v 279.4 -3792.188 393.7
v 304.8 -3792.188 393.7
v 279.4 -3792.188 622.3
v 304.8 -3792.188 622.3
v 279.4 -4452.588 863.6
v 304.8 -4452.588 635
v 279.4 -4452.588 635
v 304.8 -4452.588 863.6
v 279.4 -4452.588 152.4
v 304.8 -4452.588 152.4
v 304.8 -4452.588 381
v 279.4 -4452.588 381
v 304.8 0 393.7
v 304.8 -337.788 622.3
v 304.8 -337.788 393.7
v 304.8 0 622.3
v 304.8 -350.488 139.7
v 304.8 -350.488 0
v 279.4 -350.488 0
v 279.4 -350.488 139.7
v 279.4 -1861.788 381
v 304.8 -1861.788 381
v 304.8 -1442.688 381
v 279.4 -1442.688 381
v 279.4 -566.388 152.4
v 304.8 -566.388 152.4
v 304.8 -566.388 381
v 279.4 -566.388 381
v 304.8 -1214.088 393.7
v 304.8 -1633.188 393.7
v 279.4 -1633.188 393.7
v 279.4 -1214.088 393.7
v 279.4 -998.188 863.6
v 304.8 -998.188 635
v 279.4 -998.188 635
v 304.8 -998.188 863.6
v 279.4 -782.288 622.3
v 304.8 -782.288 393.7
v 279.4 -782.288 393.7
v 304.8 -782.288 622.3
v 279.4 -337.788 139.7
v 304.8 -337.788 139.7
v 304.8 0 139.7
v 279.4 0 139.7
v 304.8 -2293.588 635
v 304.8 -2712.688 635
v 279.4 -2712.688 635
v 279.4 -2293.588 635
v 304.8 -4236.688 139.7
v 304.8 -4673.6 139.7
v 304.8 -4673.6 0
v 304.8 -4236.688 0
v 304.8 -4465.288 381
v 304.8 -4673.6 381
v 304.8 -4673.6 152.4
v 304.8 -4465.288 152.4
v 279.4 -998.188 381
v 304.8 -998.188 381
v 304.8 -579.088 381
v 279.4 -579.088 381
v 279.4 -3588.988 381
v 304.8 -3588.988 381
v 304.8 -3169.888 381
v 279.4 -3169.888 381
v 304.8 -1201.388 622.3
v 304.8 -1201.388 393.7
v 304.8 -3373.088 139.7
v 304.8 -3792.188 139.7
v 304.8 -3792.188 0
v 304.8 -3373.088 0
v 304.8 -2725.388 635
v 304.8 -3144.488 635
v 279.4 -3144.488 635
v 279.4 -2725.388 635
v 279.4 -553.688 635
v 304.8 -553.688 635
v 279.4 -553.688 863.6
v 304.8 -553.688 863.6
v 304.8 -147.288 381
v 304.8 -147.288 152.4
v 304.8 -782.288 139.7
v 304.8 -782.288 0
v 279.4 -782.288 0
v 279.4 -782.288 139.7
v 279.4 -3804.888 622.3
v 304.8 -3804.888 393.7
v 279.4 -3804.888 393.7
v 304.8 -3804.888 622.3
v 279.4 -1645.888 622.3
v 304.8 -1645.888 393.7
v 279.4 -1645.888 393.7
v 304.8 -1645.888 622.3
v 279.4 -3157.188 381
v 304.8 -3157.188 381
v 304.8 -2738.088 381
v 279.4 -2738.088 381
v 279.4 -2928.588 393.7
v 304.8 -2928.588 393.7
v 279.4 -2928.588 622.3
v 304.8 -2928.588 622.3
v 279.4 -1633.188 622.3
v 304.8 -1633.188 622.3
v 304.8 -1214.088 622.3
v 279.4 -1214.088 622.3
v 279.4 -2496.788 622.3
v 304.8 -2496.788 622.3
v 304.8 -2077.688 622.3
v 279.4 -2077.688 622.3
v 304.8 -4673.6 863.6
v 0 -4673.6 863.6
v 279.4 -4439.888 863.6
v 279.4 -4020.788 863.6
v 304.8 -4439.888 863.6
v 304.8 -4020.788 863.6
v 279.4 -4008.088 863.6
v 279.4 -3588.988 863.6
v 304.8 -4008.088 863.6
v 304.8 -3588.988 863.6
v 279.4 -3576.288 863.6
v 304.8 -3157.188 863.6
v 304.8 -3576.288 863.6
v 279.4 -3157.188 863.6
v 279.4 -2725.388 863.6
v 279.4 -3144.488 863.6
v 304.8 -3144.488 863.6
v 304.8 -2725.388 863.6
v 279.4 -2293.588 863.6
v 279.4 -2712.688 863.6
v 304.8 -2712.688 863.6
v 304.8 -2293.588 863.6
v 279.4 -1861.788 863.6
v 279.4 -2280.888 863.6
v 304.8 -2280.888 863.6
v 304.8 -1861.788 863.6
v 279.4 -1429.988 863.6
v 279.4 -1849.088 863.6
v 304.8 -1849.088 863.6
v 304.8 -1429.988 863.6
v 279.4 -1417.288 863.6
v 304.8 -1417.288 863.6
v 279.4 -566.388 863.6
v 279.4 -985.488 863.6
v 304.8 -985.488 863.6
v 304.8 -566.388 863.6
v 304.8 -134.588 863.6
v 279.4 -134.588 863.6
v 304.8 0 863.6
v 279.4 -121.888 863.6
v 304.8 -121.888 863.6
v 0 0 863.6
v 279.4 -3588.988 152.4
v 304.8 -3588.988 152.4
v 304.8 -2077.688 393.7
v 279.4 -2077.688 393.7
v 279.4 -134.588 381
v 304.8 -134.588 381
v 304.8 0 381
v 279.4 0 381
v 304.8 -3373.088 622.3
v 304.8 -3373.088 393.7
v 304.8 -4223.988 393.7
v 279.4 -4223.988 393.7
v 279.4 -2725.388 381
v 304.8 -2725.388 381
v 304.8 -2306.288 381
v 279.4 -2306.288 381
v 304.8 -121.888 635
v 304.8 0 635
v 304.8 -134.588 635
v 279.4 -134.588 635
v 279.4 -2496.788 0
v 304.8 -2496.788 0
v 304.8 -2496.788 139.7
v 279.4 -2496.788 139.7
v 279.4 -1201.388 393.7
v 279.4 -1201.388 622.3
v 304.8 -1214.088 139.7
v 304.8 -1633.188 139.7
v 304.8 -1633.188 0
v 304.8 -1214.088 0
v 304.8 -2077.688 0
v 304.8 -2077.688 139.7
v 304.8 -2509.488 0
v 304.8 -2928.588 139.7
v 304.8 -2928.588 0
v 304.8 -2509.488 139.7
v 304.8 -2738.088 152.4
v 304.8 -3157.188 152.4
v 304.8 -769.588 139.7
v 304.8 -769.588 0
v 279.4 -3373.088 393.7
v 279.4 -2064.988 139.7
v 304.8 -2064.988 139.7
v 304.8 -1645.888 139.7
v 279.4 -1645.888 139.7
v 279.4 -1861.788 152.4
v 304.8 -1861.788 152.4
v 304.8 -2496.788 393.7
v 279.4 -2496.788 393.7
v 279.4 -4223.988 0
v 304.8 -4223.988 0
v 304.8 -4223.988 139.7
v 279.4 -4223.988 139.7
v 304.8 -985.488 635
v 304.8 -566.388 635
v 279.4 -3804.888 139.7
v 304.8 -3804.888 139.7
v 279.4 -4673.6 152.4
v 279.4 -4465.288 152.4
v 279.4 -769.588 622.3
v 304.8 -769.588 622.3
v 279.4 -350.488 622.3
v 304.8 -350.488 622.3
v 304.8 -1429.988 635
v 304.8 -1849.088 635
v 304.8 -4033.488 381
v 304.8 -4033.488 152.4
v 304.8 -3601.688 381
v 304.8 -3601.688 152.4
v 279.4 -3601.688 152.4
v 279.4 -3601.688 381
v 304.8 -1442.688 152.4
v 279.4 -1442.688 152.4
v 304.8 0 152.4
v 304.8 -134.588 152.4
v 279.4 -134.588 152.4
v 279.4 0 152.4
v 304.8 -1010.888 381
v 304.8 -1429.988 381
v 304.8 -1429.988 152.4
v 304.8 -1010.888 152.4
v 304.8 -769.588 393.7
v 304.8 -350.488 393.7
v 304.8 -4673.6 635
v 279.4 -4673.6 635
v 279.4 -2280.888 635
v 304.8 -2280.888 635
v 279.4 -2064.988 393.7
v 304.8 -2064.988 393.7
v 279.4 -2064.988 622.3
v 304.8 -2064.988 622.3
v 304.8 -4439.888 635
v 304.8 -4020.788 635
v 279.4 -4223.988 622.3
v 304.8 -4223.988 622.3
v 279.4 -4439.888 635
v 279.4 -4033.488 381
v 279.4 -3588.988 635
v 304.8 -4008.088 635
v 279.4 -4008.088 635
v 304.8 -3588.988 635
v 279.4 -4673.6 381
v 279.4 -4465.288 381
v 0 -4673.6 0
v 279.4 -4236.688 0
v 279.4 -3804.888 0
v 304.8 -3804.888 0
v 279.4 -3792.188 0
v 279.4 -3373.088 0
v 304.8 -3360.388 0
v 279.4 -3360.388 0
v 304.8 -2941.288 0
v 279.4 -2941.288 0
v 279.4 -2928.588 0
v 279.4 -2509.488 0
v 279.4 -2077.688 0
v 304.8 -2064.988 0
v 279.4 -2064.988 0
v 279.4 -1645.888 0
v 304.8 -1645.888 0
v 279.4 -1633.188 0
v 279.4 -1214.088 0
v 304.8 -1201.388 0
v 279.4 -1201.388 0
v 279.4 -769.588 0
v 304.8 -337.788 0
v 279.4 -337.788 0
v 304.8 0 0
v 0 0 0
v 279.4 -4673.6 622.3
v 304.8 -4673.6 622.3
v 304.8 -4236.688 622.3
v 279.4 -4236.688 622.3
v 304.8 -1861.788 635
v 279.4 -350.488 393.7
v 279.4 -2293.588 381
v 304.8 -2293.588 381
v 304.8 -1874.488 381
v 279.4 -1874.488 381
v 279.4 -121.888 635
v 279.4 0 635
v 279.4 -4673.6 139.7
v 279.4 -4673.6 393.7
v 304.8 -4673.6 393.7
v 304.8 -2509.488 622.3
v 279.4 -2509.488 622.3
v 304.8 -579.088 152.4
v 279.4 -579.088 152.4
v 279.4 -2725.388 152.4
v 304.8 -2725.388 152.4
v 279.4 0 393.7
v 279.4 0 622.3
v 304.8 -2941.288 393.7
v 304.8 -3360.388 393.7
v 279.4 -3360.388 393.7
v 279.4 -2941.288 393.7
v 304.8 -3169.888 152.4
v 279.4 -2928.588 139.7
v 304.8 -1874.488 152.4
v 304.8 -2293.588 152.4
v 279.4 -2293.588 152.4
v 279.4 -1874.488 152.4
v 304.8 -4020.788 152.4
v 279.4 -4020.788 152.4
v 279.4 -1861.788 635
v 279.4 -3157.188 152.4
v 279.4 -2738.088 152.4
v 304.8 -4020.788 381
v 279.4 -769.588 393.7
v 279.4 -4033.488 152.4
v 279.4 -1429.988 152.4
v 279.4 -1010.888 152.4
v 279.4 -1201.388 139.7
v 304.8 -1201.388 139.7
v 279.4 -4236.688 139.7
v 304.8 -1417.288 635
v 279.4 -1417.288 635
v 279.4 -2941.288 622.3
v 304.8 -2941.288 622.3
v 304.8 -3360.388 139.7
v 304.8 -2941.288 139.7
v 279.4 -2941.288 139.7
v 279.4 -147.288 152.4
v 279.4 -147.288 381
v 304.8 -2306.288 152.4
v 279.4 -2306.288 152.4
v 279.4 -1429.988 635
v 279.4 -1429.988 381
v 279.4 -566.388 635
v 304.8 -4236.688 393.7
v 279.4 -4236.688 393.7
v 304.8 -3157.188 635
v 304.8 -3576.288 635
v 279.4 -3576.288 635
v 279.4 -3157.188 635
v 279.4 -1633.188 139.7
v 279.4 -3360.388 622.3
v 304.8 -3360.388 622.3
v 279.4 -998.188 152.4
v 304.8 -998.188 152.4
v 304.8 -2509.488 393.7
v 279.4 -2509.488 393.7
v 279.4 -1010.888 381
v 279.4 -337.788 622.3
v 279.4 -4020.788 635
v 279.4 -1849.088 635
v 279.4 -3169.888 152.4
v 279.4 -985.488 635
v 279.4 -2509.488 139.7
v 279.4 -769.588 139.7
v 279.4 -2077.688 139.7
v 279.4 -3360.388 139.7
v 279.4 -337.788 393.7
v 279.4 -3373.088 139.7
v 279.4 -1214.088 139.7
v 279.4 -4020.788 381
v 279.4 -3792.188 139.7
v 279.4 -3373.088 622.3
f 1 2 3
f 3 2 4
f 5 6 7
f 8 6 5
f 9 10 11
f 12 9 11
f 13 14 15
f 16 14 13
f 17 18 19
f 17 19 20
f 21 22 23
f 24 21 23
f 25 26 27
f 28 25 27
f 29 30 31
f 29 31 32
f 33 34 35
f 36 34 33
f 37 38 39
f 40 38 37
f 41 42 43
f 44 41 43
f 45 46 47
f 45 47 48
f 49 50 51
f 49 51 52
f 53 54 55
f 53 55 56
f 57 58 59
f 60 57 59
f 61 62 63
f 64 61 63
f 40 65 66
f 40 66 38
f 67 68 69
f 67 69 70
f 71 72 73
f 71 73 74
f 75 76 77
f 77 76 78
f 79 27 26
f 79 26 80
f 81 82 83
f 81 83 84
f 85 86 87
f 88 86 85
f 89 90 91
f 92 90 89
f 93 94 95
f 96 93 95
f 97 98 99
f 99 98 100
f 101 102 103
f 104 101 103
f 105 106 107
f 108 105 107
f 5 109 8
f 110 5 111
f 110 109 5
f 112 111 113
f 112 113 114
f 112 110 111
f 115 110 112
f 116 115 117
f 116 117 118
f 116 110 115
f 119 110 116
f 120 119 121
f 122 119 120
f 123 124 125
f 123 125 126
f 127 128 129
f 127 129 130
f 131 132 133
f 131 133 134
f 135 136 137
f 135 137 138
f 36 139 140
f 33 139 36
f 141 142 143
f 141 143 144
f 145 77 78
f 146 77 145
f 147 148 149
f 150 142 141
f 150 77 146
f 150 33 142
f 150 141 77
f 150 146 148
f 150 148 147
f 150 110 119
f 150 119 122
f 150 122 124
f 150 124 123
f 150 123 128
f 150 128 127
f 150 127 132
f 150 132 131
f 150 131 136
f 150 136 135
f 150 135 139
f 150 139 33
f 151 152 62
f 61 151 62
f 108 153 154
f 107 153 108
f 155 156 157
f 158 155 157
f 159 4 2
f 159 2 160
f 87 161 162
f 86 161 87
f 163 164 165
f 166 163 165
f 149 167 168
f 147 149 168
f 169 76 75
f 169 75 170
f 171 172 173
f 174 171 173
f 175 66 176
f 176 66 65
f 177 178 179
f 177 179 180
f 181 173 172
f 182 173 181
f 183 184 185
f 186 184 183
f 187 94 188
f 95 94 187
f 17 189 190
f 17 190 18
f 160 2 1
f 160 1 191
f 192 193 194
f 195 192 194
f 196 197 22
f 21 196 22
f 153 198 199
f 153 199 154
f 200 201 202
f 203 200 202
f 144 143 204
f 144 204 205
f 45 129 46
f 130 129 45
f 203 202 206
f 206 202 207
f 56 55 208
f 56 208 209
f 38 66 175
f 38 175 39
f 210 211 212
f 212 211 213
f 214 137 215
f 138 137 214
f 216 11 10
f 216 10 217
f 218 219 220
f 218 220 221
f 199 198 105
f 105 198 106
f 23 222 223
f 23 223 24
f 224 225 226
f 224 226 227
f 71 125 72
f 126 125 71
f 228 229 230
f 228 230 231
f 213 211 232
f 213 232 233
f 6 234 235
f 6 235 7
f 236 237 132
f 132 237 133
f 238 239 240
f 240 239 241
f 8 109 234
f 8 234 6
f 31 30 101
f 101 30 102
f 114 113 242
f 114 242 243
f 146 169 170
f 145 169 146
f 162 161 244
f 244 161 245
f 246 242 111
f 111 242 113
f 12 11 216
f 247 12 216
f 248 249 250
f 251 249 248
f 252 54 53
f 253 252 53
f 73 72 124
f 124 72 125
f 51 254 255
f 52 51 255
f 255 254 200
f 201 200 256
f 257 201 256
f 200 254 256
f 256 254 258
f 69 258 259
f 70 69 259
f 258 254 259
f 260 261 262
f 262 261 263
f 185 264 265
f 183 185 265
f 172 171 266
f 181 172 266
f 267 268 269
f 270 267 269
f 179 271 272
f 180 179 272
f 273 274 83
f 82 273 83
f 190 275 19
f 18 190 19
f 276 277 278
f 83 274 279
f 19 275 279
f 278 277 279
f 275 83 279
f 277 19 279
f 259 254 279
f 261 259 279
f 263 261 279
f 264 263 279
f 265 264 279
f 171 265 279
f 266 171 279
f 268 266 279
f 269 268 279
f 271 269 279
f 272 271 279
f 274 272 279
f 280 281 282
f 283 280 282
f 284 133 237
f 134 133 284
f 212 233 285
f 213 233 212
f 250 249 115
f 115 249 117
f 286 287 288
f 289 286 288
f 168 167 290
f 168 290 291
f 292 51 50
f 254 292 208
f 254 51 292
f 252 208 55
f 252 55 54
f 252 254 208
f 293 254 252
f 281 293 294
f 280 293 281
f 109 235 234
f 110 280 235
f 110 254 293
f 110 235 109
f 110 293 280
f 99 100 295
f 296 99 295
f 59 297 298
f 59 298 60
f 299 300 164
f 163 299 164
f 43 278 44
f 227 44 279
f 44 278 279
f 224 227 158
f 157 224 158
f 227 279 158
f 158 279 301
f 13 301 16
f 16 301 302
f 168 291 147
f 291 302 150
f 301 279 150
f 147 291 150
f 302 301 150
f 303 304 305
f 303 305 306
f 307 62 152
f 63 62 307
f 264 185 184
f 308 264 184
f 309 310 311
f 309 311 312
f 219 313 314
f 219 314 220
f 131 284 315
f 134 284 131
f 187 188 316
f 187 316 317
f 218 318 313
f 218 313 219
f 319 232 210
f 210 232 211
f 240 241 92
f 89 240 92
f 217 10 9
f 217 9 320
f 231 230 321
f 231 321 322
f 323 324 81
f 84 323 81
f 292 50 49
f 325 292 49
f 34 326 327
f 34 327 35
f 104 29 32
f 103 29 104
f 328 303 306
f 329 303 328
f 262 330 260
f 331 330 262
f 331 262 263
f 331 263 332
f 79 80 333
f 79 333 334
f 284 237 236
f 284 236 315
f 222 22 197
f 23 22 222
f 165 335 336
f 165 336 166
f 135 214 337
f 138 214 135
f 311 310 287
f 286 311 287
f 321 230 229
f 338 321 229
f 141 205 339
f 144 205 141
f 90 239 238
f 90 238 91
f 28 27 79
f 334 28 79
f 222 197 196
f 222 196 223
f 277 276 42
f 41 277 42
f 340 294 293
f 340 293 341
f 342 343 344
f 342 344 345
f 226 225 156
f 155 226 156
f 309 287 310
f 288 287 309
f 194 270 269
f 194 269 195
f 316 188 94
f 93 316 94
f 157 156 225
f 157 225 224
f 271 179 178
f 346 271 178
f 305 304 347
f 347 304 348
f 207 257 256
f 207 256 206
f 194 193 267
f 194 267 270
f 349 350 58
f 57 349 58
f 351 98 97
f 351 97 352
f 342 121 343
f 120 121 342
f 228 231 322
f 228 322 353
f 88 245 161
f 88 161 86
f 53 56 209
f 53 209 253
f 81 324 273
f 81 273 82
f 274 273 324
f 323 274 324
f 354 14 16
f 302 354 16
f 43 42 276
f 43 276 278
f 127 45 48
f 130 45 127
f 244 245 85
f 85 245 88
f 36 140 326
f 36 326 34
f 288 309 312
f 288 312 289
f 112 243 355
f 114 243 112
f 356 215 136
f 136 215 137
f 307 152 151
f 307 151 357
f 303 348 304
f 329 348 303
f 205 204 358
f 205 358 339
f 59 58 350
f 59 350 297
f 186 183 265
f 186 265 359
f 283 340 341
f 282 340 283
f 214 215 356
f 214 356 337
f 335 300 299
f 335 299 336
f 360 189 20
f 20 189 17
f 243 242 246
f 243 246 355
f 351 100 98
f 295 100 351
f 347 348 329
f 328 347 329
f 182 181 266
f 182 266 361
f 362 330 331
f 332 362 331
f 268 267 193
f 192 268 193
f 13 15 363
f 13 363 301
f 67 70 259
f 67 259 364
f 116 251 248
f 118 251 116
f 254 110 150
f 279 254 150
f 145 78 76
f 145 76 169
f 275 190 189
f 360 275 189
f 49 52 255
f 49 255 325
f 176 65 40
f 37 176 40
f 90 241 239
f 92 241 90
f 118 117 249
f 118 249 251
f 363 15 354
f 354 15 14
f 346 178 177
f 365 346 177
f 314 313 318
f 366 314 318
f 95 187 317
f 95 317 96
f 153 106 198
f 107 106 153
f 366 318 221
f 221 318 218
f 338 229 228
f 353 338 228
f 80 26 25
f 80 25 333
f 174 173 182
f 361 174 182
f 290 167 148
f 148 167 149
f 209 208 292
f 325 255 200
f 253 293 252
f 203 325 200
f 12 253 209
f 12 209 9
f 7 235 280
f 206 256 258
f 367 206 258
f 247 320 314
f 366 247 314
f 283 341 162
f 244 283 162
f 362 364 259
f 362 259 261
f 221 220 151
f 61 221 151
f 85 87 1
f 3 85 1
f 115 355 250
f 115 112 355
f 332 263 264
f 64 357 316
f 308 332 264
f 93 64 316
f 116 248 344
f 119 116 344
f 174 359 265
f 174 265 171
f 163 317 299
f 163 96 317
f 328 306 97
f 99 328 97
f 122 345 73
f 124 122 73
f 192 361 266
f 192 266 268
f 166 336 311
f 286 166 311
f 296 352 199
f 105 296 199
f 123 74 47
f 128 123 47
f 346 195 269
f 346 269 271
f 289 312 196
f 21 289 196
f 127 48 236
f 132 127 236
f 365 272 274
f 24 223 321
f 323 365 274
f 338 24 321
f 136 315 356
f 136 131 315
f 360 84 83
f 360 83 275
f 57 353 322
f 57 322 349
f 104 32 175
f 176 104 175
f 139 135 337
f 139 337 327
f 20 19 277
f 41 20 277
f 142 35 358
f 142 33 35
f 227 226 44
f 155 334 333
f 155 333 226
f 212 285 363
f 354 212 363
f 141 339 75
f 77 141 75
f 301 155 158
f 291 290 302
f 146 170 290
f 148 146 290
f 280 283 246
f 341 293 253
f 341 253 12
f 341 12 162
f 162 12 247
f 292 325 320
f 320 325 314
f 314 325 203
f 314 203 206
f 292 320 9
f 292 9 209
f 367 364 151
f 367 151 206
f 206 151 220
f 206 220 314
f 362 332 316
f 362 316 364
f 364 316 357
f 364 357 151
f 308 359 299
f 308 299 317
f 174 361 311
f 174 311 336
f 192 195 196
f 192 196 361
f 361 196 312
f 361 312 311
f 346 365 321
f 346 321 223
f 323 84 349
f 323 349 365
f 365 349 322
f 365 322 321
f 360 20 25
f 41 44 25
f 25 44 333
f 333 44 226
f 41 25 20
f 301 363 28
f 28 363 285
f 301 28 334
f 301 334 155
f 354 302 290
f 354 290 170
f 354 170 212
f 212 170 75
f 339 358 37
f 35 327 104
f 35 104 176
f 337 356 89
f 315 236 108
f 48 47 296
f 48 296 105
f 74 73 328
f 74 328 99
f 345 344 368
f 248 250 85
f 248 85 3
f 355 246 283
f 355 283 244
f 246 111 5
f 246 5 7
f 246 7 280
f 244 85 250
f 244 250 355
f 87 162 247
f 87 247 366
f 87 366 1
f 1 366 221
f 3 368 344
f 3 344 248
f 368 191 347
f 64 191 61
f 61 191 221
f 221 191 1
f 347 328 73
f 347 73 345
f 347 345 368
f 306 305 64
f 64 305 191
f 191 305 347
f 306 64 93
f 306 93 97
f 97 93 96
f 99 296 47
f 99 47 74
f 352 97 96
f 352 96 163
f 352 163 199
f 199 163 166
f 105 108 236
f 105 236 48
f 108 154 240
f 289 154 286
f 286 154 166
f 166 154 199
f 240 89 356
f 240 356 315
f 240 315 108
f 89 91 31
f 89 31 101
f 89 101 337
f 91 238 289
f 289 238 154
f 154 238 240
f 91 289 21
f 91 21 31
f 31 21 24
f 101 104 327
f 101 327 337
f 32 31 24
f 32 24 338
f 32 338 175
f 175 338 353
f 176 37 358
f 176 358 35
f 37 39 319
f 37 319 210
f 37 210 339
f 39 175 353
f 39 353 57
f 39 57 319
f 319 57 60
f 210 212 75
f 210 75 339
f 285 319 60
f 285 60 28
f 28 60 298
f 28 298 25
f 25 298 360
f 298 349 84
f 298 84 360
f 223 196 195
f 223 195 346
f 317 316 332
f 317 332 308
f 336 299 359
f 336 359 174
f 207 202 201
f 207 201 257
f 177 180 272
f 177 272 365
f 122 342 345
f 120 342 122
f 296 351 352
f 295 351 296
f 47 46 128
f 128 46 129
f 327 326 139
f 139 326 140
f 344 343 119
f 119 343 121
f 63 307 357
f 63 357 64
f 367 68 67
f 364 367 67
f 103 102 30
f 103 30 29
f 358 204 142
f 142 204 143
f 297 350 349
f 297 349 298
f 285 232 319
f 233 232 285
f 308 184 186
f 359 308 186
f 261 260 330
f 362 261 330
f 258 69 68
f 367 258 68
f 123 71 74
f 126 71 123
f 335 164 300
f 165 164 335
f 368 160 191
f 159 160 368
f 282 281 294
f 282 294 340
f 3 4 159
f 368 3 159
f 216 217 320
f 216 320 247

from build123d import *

# Parameters (mm, degrees)
F0_W     = 4673.6
F0_H     = 863.6
F1_DEPTH = 304.8
F2_W     = 4973.870874
F2_H     = 12.7
F2_W_2   = 5047.692343
F2_W_3   = 5047.768645
F3_DEPTH = 25.4
F4_W     = 12.7
F4_H     = 228.6
F4_H_2   = 139.7
F5_DEPTH = 25.4


with BuildPart() as f1:
    # F0 (on Right) → F1 (new body)
    with BuildSketch(Plane.YZ):
        with Locations((-2336.8, 431.8)):
            Rectangle(F0_W, F0_H)
    extrude(amount=F1_DEPTH)

    # F2 (on face) → F3 (cut)
    with BuildSketch(Plane.YZ.offset(304.8)):
        with Locations((-2338.139236, 628.65)):
            Rectangle(F2_W, F2_H)
        with Locations((-2319.762207, 387.35)):
            Rectangle(F2_W_2, F2_H)
        with Locations((-2421.243641, 146.05)):
            Rectangle(F2_W_3, F2_H)
    extrude(amount=-F3_DEPTH, mode=Mode.SUBTRACT)

    # F4 (on face) → F5 (cut)
    with BuildSketch(Plane.YZ.offset(304.8)):
        with Locations((-4446.238081, 749.3)):
            Rectangle(F4_W, F4_H)
        with Locations((-4230.338081, 508)):
            Rectangle(F4_W, F4_H)
        with Locations((-4458.938081, 266.7)):
            Rectangle(F4_W, F4_H)
        with Locations((-4230.338081, 69.85)):
            Rectangle(F4_W, F4_H_2)
        with Locations((-4027.138081, 266.7)):
            Rectangle(F4_W, F4_H)
        with Locations((-3798.538081, 69.85)):
            Rectangle(F4_W, F4_H_2)
        with Locations((-3798.538081, 508)):
            Rectangle(F4_W, F4_H)
        with Locations((-4014.438081, 749.3)):
            Rectangle(F4_W, F4_H)
        with Locations((-3595.338081, 266.7)):
            Rectangle(F4_W, F4_H)
        with Locations((-3366.738081, 69.85)):
            Rectangle(F4_W, F4_H_2)
        with Locations((-3366.738081, 508)):
            Rectangle(F4_W, F4_H)
        with Locations((-3582.638081, 749.3)):
            Rectangle(F4_W, F4_H)
        with Locations((-3163.538081, 266.7)):
            Rectangle(F4_W, F4_H)
        with Locations((-2934.938081, 69.85)):
            Rectangle(F4_W, F4_H_2)
        with Locations((-2934.938081, 508)):
            Rectangle(F4_W, F4_H)
        with Locations((-3150.838081, 749.3)):
            Rectangle(F4_W, F4_H)
        with Locations((-2731.738081, 266.7)):
            Rectangle(F4_W, F4_H)
        with Locations((-2503.138081, 69.85)):
            Rectangle(F4_W, F4_H_2)
        with Locations((-2503.138081, 508)):
            Rectangle(F4_W, F4_H)
        with Locations((-2719.038081, 749.3)):
            Rectangle(F4_W, F4_H)
        with Locations((-2299.938081, 266.7)):
            Rectangle(F4_W, F4_H)
        with Locations((-2071.338081, 69.85)):
            Rectangle(F4_W, F4_H_2)
        with Locations((-2071.338081, 508)):
            Rectangle(F4_W, F4_H)
        with Locations((-2287.238081, 749.3)):
            Rectangle(F4_W, F4_H)
        with Locations((-1868.138081, 266.7)):
            Rectangle(F4_W, F4_H)
        with Locations((-1639.538081, 69.85)):
            Rectangle(F4_W, F4_H_2)
        with Locations((-1639.538081, 508)):
            Rectangle(F4_W, F4_H)
        with Locations((-1855.438081, 749.3)):
            Rectangle(F4_W, F4_H)
        with Locations((-1436.338081, 266.7)):
            Rectangle(F4_W, F4_H)
        with Locations((-1207.738081, 69.85)):
            Rectangle(F4_W, F4_H_2)
        with Locations((-1207.738081, 508)):
            Rectangle(F4_W, F4_H)
        with Locations((-1423.638081, 749.3)):
            Rectangle(F4_W, F4_H)
        with Locations((-1004.538081, 266.7)):
            Rectangle(F4_W, F4_H)
        with Locations((-775.938081, 69.85)):
            Rectangle(F4_W, F4_H_2)
        with Locations((-775.938081, 508)):
            Rectangle(F4_W, F4_H)
        with Locations((-991.838081, 749.3)):
            Rectangle(F4_W, F4_H)
        with Locations((-572.738081, 266.7)):
            Rectangle(F4_W, F4_H)
        with Locations((-344.138081, 69.85)):
            Rectangle(F4_W, F4_H_2)
        with Locations((-344.138081, 508)):
            Rectangle(F4_W, F4_H)
        with Locations((-560.038081, 749.3)):
            Rectangle(F4_W, F4_H)
        with Locations((-140.938081, 266.7)):
            Rectangle(F4_W, F4_H)
        with Locations((87.661919, 69.85)):
            Rectangle(F4_W, F4_H_2)
        with Locations((87.661919, 508)):
            Rectangle(F4_W, F4_H)
        with Locations((-128.238081, 749.3)):
            Rectangle(F4_W, F4_H)
    extrude(amount=-F5_DEPTH, mode=Mode.SUBTRACT)


solid = f1.part
